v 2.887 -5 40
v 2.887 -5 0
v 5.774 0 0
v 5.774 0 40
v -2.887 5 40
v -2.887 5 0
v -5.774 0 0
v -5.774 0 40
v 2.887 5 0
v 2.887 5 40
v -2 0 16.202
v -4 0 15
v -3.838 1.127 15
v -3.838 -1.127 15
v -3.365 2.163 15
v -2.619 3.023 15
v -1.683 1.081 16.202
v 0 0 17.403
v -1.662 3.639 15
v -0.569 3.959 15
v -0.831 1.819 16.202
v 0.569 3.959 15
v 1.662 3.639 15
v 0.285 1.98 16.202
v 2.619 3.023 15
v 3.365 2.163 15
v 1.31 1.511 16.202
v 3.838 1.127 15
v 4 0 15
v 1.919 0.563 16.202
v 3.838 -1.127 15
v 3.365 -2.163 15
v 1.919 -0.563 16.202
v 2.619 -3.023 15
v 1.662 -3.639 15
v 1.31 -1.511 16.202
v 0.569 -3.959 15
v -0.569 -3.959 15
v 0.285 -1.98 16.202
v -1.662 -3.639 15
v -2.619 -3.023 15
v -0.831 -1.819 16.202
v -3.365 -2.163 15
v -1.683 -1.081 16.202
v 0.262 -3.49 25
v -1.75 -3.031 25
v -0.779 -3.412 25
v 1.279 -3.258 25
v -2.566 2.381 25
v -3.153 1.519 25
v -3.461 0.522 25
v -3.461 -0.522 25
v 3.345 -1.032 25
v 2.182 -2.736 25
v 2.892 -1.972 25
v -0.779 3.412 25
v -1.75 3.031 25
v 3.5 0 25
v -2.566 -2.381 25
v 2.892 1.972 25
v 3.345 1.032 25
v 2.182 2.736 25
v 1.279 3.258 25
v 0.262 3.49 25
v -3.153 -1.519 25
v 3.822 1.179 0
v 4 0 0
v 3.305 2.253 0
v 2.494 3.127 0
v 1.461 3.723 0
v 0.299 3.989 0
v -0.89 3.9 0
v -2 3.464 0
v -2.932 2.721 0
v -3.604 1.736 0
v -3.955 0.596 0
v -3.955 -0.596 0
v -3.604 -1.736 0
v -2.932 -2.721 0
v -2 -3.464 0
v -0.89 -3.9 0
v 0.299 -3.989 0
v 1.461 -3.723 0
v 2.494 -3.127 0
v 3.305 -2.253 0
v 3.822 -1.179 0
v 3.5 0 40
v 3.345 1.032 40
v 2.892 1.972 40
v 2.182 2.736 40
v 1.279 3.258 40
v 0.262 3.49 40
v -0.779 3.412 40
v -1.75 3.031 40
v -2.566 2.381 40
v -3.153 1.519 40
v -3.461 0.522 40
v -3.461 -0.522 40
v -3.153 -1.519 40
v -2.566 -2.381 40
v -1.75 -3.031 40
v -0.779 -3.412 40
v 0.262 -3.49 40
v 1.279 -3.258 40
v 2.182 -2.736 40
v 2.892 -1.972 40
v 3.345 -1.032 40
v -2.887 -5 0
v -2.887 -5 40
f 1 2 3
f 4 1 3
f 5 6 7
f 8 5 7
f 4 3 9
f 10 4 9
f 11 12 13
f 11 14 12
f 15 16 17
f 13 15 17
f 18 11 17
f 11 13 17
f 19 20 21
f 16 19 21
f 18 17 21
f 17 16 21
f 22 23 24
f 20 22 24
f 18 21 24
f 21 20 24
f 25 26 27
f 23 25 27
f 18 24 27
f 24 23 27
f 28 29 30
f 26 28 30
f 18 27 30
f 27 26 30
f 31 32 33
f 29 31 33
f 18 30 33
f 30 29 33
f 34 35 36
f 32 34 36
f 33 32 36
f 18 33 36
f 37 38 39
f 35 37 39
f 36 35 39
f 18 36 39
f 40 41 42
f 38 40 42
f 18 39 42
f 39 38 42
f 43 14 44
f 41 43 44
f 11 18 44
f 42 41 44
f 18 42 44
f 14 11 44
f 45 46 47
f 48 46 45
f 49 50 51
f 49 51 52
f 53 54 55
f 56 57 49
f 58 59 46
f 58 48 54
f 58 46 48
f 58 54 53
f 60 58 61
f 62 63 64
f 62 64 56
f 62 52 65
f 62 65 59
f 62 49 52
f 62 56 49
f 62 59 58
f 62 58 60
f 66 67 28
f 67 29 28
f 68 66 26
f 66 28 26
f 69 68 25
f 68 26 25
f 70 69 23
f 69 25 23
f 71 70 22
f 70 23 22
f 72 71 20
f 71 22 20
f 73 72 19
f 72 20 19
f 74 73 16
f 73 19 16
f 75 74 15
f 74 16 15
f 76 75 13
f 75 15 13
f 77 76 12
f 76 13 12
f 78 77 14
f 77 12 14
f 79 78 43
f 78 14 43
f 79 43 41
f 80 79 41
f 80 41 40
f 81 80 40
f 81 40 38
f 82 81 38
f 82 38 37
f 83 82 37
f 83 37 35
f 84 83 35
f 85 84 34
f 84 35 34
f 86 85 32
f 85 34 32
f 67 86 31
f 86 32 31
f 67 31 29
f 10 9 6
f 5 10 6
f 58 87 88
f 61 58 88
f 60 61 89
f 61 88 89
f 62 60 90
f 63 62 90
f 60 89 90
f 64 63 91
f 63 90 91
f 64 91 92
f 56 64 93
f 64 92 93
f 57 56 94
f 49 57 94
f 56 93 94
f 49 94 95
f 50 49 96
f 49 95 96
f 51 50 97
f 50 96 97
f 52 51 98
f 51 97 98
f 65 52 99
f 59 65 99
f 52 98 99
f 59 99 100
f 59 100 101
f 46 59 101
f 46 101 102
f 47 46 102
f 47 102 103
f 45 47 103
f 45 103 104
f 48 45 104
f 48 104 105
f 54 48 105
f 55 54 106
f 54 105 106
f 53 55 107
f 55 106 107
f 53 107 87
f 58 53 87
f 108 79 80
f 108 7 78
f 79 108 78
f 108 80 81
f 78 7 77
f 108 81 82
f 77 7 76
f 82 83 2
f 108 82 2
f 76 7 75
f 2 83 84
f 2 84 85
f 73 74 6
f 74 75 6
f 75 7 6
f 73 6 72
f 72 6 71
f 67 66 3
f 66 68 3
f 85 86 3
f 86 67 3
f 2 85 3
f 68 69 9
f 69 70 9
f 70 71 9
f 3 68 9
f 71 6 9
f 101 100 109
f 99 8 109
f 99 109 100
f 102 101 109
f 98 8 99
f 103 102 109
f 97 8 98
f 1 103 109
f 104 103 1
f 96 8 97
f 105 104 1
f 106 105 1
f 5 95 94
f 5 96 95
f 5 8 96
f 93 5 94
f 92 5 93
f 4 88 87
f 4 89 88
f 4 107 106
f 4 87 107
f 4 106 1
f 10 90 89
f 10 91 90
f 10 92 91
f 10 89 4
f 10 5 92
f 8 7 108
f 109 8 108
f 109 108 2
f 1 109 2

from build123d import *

# Parameters (mm, degrees)
BOSS_EXTRUDE1_DEPTH          = 40
SKETCH2_R                    = 3.5
CUT_EXTRUDE1_DEPTH           = 15
F_8_0_8_DIAMETER_HOLE1_D     = 8
F_8_0_8_DIAMETER_HOLE1_DEPTH = 15
F_8_0_8_DIAMETER_HOLE1_TIP   = 2.403442476


with BuildPart() as part:
    # Sketch1 → Boss-Extrude1 (new body)
    with BuildSketch(Plane.XY):
        Polygon((5.773502692, 0), (2.886751346, 5), (-2.886751346, 5), (-5.773502692, 0), (-2.886751346, -5), (2.886751346, -5), align=None)
    extrude(amount=BOSS_EXTRUDE1_DEPTH)

    # Sketch2 → Cut-Extrude1 (cut)
    with BuildSketch(Plane.XY.offset(40)):
        Circle(SKETCH2_R)
    extrude(amount=-CUT_EXTRUDE1_DEPTH, mode=Mode.SUBTRACT)

    # Ø8.0 (8) Diameter Hole1
    with Locations(Plane(origin=(0, 0, 0), x_dir=(-1, 0, 0), z_dir=(0, 0, -1))):
        with Locations((0, 0)):
            Hole(F_8_0_8_DIAMETER_HOLE1_D / 2, depth=F_8_0_8_DIAMETER_HOLE1_DEPTH)
            with Locations((0, 0, -(F_8_0_8_DIAMETER_HOLE1_DEPTH + F_8_0_8_DIAMETER_HOLE1_TIP / 2))):  # 118° drill point
                Cone(0, F_8_0_8_DIAMETER_HOLE1_D / 2, F_8_0_8_DIAMETER_HOLE1_TIP, mode=Mode.SUBTRACT)


solid = part.part
